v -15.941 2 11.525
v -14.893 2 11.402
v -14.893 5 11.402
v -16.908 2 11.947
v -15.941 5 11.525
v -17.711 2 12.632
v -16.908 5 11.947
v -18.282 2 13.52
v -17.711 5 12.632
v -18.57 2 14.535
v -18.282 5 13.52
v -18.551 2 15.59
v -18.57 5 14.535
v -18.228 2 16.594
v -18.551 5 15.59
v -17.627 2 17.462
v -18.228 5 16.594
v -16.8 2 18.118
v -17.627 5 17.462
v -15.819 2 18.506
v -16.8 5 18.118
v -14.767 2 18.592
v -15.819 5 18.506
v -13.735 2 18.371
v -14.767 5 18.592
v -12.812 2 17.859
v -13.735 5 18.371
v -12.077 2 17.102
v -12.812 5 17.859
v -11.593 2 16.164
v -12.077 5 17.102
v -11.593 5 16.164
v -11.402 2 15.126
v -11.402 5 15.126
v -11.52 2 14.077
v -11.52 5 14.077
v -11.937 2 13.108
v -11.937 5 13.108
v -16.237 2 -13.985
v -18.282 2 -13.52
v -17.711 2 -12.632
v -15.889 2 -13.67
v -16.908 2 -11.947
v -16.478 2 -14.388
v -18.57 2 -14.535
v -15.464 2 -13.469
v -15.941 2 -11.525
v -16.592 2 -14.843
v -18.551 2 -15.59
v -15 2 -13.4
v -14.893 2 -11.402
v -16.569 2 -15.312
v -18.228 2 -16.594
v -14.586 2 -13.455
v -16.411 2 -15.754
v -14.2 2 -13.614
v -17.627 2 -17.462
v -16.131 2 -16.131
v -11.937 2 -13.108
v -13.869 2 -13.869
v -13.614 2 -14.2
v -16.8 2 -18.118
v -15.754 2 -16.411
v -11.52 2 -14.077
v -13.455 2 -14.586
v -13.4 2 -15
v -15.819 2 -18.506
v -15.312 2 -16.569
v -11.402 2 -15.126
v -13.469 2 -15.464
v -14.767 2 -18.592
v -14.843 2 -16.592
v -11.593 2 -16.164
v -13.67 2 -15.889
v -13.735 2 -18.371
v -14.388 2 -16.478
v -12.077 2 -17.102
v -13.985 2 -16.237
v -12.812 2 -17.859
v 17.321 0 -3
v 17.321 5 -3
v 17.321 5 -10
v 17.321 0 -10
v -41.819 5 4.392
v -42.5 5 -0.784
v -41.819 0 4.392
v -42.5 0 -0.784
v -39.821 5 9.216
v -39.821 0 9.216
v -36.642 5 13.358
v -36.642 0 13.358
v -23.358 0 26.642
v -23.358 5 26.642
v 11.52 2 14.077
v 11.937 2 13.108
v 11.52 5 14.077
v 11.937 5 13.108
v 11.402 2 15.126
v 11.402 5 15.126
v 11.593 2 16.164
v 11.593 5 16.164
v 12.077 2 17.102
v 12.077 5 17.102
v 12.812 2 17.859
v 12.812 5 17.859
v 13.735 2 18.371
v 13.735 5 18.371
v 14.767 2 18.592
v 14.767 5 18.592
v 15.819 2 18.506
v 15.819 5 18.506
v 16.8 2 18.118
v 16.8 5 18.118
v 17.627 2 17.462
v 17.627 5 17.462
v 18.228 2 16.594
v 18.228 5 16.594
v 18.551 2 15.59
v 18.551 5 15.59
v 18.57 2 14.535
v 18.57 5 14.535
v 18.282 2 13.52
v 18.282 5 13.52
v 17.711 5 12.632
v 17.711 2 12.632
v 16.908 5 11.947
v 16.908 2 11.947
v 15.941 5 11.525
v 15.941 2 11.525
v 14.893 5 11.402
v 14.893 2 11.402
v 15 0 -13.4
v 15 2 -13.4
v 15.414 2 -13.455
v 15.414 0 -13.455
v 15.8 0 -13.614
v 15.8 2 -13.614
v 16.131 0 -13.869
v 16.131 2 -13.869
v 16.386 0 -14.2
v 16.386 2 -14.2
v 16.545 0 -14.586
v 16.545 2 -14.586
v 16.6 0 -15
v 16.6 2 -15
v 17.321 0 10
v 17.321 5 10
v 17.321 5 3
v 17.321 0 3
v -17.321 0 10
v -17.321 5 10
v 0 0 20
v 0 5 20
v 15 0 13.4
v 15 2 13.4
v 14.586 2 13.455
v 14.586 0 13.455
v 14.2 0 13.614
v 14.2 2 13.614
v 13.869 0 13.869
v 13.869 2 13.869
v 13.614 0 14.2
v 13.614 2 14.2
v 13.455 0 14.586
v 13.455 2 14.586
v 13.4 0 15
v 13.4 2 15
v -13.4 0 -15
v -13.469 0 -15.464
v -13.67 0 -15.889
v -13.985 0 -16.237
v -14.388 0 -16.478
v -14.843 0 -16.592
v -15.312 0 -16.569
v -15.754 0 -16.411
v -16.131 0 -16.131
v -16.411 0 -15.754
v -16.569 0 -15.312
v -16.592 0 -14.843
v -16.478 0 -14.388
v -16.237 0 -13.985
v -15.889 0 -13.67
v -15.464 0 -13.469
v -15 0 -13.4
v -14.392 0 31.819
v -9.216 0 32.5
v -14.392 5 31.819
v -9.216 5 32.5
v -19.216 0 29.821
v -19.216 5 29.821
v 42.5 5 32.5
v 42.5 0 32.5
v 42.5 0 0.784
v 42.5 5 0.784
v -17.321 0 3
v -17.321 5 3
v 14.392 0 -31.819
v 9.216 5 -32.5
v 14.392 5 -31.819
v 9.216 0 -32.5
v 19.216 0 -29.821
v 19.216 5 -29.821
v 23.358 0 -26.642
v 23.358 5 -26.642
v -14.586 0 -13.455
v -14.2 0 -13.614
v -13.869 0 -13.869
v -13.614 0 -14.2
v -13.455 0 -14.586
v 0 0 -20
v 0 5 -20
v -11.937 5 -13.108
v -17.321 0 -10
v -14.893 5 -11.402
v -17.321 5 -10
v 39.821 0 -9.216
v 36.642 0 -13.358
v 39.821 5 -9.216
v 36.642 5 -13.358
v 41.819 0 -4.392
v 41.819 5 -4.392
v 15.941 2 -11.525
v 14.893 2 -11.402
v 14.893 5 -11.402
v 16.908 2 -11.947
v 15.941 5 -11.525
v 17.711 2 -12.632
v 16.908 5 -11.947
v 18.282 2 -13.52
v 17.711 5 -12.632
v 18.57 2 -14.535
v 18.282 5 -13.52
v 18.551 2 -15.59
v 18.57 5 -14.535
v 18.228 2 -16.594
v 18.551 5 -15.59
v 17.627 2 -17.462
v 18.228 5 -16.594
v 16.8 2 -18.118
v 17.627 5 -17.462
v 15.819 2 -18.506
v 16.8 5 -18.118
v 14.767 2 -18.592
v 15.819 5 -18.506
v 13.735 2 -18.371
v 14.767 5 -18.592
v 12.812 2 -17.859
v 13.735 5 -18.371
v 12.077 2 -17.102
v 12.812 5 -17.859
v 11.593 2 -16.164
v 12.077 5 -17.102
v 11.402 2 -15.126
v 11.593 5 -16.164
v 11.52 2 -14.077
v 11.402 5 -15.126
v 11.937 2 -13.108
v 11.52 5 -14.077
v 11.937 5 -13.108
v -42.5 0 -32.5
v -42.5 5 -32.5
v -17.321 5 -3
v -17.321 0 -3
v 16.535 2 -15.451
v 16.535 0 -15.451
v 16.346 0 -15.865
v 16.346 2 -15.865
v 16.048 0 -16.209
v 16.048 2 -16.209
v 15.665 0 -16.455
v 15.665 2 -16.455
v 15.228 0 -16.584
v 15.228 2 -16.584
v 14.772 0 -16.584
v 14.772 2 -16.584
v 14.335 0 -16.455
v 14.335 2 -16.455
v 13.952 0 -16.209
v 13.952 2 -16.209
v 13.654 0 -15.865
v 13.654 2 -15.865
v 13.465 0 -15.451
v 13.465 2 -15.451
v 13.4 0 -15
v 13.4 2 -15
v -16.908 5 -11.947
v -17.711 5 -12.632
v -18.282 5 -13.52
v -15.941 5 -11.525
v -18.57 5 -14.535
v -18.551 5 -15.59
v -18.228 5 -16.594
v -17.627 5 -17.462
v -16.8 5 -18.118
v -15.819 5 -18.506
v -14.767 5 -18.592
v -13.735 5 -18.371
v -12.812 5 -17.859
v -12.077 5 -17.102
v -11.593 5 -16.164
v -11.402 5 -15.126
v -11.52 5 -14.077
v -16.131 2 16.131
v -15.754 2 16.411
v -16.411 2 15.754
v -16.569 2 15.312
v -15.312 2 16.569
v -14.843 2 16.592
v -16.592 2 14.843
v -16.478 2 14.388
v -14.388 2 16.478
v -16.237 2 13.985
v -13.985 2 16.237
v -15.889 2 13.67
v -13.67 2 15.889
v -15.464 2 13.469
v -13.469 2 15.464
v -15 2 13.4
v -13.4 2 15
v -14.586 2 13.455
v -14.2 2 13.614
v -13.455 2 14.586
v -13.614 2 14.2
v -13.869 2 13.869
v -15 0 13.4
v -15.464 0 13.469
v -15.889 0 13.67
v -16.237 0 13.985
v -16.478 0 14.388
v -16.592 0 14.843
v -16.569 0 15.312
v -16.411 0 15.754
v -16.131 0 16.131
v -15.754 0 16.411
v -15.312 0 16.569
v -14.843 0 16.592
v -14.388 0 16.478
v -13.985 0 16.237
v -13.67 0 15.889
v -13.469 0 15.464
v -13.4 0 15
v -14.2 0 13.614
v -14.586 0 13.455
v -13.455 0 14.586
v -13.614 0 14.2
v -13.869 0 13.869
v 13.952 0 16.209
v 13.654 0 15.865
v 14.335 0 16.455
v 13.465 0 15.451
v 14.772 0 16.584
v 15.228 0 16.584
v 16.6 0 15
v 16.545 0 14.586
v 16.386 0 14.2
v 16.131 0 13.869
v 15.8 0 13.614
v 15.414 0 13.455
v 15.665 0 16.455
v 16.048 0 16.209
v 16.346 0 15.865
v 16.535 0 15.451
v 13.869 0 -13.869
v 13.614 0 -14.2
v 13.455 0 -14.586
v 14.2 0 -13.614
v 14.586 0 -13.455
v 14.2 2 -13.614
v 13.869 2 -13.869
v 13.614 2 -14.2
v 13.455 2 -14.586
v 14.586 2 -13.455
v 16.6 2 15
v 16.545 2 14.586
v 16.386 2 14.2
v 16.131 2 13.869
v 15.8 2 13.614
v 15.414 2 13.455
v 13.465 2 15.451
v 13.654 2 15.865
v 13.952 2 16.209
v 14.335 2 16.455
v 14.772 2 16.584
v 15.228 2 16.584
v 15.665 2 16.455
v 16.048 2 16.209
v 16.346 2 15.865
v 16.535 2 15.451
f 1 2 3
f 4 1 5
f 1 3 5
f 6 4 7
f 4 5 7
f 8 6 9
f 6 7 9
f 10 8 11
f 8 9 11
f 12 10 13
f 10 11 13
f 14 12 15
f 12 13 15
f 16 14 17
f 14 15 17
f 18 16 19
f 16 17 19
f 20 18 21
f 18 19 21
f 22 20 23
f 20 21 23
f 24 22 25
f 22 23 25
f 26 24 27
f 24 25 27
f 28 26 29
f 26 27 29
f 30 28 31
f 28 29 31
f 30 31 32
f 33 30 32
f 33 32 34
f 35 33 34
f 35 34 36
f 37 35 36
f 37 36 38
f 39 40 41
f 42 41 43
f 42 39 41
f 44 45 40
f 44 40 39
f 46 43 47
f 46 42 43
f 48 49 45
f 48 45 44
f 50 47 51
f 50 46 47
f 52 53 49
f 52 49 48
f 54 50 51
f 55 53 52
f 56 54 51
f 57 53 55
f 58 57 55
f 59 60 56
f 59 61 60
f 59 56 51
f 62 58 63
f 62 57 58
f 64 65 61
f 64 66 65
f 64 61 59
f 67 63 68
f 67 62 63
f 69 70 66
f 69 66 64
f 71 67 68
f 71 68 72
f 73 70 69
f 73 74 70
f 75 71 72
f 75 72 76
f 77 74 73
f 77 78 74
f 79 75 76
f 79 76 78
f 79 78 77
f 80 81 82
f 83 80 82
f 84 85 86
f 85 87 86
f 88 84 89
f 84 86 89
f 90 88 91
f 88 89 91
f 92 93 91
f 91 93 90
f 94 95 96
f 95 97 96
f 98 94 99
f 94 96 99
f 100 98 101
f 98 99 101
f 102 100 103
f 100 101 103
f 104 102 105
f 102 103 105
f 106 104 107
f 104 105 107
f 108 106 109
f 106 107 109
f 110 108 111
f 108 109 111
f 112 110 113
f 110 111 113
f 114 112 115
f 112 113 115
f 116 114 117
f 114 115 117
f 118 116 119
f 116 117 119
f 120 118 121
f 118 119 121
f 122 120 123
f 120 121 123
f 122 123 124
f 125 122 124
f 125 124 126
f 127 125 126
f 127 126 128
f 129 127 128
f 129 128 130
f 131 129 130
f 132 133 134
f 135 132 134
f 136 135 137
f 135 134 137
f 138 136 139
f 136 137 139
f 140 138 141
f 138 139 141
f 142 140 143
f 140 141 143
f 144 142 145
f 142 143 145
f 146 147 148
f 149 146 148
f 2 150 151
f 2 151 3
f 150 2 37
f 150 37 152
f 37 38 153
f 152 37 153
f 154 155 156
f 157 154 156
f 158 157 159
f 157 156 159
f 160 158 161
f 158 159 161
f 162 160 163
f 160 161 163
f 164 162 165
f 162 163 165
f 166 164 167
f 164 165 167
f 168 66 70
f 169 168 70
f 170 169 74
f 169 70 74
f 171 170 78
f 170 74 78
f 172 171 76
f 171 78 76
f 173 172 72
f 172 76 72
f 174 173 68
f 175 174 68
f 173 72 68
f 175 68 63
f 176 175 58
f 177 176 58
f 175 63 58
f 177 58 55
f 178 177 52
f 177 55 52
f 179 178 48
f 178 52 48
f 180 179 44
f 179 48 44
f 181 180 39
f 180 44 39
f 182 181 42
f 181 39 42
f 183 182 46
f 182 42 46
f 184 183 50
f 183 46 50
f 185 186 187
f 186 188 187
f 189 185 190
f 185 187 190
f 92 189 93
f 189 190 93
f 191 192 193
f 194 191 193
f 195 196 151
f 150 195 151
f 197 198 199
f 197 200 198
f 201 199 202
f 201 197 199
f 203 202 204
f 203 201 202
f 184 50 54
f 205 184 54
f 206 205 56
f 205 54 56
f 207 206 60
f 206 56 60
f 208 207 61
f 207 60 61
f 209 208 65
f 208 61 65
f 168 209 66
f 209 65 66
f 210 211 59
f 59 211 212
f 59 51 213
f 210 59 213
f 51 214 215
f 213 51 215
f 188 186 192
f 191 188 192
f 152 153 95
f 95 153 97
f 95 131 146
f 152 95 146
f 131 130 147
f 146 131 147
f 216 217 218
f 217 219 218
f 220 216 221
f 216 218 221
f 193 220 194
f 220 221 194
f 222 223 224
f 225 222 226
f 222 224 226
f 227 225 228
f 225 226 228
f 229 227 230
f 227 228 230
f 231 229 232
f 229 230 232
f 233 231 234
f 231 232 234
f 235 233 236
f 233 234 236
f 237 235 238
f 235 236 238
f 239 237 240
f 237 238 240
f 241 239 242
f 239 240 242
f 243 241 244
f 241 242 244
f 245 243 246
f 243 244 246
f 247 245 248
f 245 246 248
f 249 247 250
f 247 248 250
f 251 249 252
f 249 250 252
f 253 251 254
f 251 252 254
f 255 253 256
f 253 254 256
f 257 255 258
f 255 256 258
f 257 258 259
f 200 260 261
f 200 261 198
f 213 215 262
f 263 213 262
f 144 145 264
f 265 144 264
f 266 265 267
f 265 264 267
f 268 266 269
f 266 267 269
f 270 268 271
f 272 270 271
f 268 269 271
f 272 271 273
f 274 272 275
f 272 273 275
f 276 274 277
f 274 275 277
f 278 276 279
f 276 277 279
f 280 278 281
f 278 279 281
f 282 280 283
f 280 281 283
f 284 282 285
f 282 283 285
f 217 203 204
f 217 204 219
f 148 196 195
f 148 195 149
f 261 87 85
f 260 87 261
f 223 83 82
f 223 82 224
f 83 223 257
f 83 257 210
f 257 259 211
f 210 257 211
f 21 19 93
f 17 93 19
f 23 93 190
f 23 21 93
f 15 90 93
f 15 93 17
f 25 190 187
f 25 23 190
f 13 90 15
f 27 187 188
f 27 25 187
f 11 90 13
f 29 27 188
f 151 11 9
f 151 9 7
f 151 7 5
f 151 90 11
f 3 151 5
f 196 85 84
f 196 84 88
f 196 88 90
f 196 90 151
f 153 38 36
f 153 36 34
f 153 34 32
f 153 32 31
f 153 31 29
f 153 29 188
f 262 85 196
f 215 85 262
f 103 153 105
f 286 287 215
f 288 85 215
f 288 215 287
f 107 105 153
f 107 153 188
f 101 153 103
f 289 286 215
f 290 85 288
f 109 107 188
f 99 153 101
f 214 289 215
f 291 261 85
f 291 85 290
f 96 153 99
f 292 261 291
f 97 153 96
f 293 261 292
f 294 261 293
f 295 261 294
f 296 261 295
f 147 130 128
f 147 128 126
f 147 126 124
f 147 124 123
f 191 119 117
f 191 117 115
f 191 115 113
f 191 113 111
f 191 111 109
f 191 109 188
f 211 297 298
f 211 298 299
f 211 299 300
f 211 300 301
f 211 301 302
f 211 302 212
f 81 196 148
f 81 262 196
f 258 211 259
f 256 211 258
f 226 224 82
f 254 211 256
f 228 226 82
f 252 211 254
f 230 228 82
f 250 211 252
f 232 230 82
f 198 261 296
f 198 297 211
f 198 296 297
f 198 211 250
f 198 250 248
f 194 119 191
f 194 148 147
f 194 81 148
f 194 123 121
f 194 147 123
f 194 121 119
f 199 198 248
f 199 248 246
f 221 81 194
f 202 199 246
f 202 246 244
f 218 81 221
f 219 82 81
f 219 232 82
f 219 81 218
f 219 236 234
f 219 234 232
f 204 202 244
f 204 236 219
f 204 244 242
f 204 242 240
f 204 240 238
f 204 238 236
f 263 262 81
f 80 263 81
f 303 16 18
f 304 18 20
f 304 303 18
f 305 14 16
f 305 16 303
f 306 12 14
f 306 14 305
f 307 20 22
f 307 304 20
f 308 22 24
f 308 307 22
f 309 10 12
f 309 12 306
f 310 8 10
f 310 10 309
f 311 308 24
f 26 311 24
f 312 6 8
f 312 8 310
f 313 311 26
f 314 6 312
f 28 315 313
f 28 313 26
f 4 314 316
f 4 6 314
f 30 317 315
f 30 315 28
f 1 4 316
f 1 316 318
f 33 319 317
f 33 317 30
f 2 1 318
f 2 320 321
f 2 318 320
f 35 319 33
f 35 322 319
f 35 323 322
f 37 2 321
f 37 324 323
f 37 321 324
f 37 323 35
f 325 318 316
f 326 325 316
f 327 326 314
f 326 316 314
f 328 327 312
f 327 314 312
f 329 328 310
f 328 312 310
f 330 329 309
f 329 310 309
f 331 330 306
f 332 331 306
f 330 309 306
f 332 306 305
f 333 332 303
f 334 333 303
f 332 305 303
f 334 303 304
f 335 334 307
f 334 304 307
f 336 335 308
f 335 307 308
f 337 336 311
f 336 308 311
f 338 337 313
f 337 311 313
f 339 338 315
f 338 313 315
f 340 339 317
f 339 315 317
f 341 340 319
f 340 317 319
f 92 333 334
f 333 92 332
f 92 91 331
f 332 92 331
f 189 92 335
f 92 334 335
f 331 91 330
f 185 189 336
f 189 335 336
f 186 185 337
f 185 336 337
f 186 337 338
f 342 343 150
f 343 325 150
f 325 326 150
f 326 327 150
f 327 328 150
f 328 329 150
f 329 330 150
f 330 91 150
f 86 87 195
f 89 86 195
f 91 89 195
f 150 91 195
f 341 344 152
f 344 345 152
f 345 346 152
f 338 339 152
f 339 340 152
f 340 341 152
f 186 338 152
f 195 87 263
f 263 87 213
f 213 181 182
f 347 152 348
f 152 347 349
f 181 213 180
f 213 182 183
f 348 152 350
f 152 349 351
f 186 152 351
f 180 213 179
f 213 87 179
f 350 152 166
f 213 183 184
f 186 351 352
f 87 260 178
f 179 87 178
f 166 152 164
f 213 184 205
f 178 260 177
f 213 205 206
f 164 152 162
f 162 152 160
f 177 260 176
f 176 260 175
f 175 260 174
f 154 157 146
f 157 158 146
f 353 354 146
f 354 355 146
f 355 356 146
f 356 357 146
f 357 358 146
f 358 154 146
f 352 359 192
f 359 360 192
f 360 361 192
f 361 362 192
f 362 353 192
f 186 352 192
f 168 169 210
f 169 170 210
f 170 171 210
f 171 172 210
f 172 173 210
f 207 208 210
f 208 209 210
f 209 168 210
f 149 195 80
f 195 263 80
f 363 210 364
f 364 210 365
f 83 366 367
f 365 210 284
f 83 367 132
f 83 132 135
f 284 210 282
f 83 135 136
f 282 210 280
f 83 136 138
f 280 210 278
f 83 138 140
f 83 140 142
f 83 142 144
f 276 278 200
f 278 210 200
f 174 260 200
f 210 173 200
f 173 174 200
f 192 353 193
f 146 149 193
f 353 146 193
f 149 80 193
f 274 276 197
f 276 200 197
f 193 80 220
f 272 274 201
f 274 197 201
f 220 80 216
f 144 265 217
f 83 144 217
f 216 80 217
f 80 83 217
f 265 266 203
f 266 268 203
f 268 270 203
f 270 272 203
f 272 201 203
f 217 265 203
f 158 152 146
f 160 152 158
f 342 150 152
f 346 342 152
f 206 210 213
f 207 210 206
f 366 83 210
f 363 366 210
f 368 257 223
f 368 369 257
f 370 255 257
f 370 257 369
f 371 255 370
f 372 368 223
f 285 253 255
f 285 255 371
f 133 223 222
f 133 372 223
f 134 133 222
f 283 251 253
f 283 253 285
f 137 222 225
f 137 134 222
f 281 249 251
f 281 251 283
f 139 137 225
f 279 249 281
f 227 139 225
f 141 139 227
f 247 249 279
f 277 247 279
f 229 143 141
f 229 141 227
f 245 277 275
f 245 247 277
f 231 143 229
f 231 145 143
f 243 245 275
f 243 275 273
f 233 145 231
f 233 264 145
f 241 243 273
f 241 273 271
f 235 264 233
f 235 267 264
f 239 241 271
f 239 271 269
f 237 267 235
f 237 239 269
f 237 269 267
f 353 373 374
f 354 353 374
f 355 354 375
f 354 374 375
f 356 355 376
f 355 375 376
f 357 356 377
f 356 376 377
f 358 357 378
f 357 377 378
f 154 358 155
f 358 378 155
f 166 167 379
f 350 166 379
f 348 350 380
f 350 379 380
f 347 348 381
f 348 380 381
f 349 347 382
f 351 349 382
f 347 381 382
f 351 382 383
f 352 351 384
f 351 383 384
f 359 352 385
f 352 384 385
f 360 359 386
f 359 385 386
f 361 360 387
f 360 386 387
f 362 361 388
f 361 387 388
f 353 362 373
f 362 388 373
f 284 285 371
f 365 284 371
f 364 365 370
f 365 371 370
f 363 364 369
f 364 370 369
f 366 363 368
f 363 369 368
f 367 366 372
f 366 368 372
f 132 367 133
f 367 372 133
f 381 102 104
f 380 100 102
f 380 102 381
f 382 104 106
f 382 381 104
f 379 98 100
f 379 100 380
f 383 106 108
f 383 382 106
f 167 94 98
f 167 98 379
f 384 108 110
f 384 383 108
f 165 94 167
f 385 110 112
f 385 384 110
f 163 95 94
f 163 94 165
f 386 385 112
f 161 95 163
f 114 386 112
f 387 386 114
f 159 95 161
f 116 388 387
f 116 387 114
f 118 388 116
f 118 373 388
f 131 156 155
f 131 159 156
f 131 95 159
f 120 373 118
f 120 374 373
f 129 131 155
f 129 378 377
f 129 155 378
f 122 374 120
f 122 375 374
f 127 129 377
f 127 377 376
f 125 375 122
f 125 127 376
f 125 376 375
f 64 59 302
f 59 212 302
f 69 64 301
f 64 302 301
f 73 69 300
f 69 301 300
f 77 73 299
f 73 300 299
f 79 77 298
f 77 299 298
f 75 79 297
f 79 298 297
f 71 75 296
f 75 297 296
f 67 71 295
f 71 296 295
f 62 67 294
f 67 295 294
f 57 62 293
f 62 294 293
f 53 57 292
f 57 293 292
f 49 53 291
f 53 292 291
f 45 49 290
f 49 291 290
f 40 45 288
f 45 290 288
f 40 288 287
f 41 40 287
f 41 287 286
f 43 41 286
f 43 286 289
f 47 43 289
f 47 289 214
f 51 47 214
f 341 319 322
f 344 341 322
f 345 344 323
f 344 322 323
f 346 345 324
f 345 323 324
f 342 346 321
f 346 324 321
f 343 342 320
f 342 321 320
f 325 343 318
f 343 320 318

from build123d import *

# Parameters (mm, degrees)
SKETCH1_W           = 85
SKETCH1_H           = 65
BOSS_EXTRUDE1_DEPTH = 5
CUT_EXTRUDE1_DEPTH  = 46
CUT_EXTRUDE2_DEPTH  = 46
SKETCH5_W           = 45.682853102
SKETCH5_H           = 6
BOSS_EXTRUDE3_DEPTH = 5
SKETCH6_R           = 3.6
CUT_EXTRUDE3_DEPTH  = 3
CUT_EXTRUDE4_DEPTH  = 5
FILLET1_R           = 20


with BuildPart() as part:
    # Sketch1 → Boss-Extrude1 (new body)
    with BuildSketch(Plane(origin=(0, 0, 0), x_dir=(1, 0, 0), z_dir=(0, 1, 0))):
        Rectangle(SKETCH1_W, SKETCH1_H)
    extrude(amount=BOSS_EXTRUDE1_DEPTH)

    # Sketch3 → Cut-Extrude1 (cut)
    with BuildSketch(Plane(origin=(0, 5, 0), x_dir=(1, 0, 0), z_dir=(0, 1, 0))):
        with BuildLine():
            ThreePointArc((-13.4, 15), (-16.13137085, 16.13137085), (-15, 13.4))
            Line((-15, 13.4), (-15, 15))
            Line((-15, 15), (-13.4, 15))
        make_face()
        with BuildLine():
            Line((-15, 15), (-15, 13.4))
            ThreePointArc((-15, 13.4), (-13.86862915, 13.86862915), (-13.4, 15))
            Line((-13.4, 15), (-15, 15))
        make_face()
        with BuildLine():
            ThreePointArc((-13.4, 15), (-16.13137085, 16.13137085), (-15, 13.4))
            Line((-15, 13.4), (-15, 15))
            Line((-15, 15), (-13.4, 15))
        make_face()
        with BuildLine():
            Line((-15, 15), (-15, 13.4))
            ThreePointArc((-15, 13.4), (-13.86862915, 13.86862915), (-13.4, 15))
            Line((-13.4, 15), (-15, 15))
        make_face()
        with BuildLine():
            ThreePointArc((13.4, 15), (13.86862915, 13.86862915), (15, 13.4))
            Line((15, 13.4), (15, 15))
            Line((15, 15), (13.4, 15))
        make_face()
        with BuildLine():
            Line((15, 15), (15, 13.4))
            ThreePointArc((15, 13.4), (16.13137085, 13.86862915), (16.6, 15))
            ThreePointArc((16.6, 15), (15, 16.6), (13.4, 15))
            Line((13.4, 15), (15, 15))
        make_face()
        with BuildLine():
            ThreePointArc((13.4, 15), (13.86862915, 13.86862915), (15, 13.4))
            Line((15, 13.4), (15, 15))
            Line((15, 15), (13.4, 15))
        make_face()
        with BuildLine():
            Line((15, 15), (15, 13.4))
            ThreePointArc((15, 13.4), (16.13137085, 13.86862915), (16.6, 15))
            ThreePointArc((16.6, 15), (15, 16.6), (13.4, 15))
            Line((13.4, 15), (15, 15))
        make_face()
        with BuildLine():
            Line((-15, -13.4), (-15, -15))
            Line((-15, -15), (-13.4, -15))
            ThreePointArc((-13.4, -15), (-13.86862915, -13.86862915), (-15, -13.4))
        make_face()
        with BuildLine():
            Line((-13.4, -15), (-15, -15))
            Line((-15, -15), (-15, -13.4))
            ThreePointArc((-15, -13.4), (-16.13137085, -16.13137085), (-13.4, -15))
        make_face()
        with BuildLine():
            Line((-15, -13.4), (-15, -15))
            Line((-15, -15), (-13.4, -15))
            ThreePointArc((-13.4, -15), (-13.86862915, -13.86862915), (-15, -13.4))
        make_face()
        with BuildLine():
            Line((-13.4, -15), (-15, -15))
            Line((-15, -15), (-15, -13.4))
            ThreePointArc((-15, -13.4), (-16.13137085, -16.13137085), (-13.4, -15))
        make_face()
        with BuildLine():
            ThreePointArc((15, -13.4), (13.86862915, -13.86862915), (13.4, -15))
            Line((13.4, -15), (15, -15))
            Line((15, -15), (15, -13.4))
        make_face()
        with BuildLine():
            Line((15, -15), (13.4, -15))
            ThreePointArc((13.4, -15), (15, -16.6), (16.6, -15))
            ThreePointArc((16.6, -15), (16.13137085, -13.86862915), (15, -13.4))
            Line((15, -13.4), (15, -15))
        make_face()
        with BuildLine():
            ThreePointArc((15, -13.4), (13.86862915, -13.86862915), (13.4, -15))
            Line((13.4, -15), (15, -15))
            Line((15, -15), (15, -13.4))
        make_face()
        with BuildLine():
            Line((15, -15), (13.4, -15))
            ThreePointArc((13.4, -15), (15, -16.6), (16.6, -15))
            ThreePointArc((16.6, -15), (16.13137085, -13.86862915), (15, -13.4))
            Line((15, -13.4), (15, -15))
        make_face()
    extrude(amount=-CUT_EXTRUDE1_DEPTH, mode=Mode.SUBTRACT)

    # Sketch4 → Cut-Extrude2 (cut)
    with BuildSketch(Plane(origin=(0, 5, 0), x_dir=(1, 0, 0), z_dir=(0, 1, 0))):
        Polygon((0, -20), (17.320508076, -10), (17.320508076, 10), (0, 20), (-17.320508076, 10), (-17.320508076, -10), align=None)
    extrude(amount=-CUT_EXTRUDE2_DEPTH, mode=Mode.SUBTRACT)

    # Sketch5 → Boss-Extrude3 (add)
    with BuildSketch(Plane(origin=(0, 5, 0), x_dir=(1, 0, 0), z_dir=(0, 1, 0))):
        Rectangle(SKETCH5_W, SKETCH5_H)
    extrude(amount=-BOSS_EXTRUDE3_DEPTH)

    # Sketch6 → Cut-Extrude3 (cut)
    with BuildSketch(Plane(origin=(0, 5, 0), x_dir=(1, 0, 0), z_dir=(0, 1, 0))):
        with Locations((-15, 15)):
            Circle(SKETCH6_R)
        with Locations((15, 15)):
            Circle(SKETCH6_R)
        with Locations((-15, -15)):
            Circle(SKETCH6_R)
        with Locations((15, -15)):
            Circle(SKETCH6_R)
    extrude(amount=-CUT_EXTRUDE3_DEPTH, mode=Mode.SUBTRACT)

    # Sketch7 → Cut-Extrude4 (cut, symmetric)
    with BuildSketch(Plane(origin=(0, 5, 0), x_dir=(1, 0, 0), z_dir=(0, 1, 0))):
        Polygon((17.5, 32.5), (42.5, 7.5), (42.5, 32.5), align=None)
        Polygon((-42.5, -32.5), (-17.5, -32.5), (-42.5, -7.5), align=None)
    extrude(amount=CUT_EXTRUDE4_DEPTH, both=True, mode=Mode.SUBTRACT)

    # Fillet1
    fillet1_edges = [part.edges().sort_by_distance(p)[0] for p in [
        (42.5, 2.5, -7.5),
        (17.5, 2.5, -32.5),
        (-17.5, 2.5, 32.5),
        (-42.5, 2.5, 7.5),
    ]]
    fillet(fillet1_edges, radius=FILLET1_R)


solid = part.part
